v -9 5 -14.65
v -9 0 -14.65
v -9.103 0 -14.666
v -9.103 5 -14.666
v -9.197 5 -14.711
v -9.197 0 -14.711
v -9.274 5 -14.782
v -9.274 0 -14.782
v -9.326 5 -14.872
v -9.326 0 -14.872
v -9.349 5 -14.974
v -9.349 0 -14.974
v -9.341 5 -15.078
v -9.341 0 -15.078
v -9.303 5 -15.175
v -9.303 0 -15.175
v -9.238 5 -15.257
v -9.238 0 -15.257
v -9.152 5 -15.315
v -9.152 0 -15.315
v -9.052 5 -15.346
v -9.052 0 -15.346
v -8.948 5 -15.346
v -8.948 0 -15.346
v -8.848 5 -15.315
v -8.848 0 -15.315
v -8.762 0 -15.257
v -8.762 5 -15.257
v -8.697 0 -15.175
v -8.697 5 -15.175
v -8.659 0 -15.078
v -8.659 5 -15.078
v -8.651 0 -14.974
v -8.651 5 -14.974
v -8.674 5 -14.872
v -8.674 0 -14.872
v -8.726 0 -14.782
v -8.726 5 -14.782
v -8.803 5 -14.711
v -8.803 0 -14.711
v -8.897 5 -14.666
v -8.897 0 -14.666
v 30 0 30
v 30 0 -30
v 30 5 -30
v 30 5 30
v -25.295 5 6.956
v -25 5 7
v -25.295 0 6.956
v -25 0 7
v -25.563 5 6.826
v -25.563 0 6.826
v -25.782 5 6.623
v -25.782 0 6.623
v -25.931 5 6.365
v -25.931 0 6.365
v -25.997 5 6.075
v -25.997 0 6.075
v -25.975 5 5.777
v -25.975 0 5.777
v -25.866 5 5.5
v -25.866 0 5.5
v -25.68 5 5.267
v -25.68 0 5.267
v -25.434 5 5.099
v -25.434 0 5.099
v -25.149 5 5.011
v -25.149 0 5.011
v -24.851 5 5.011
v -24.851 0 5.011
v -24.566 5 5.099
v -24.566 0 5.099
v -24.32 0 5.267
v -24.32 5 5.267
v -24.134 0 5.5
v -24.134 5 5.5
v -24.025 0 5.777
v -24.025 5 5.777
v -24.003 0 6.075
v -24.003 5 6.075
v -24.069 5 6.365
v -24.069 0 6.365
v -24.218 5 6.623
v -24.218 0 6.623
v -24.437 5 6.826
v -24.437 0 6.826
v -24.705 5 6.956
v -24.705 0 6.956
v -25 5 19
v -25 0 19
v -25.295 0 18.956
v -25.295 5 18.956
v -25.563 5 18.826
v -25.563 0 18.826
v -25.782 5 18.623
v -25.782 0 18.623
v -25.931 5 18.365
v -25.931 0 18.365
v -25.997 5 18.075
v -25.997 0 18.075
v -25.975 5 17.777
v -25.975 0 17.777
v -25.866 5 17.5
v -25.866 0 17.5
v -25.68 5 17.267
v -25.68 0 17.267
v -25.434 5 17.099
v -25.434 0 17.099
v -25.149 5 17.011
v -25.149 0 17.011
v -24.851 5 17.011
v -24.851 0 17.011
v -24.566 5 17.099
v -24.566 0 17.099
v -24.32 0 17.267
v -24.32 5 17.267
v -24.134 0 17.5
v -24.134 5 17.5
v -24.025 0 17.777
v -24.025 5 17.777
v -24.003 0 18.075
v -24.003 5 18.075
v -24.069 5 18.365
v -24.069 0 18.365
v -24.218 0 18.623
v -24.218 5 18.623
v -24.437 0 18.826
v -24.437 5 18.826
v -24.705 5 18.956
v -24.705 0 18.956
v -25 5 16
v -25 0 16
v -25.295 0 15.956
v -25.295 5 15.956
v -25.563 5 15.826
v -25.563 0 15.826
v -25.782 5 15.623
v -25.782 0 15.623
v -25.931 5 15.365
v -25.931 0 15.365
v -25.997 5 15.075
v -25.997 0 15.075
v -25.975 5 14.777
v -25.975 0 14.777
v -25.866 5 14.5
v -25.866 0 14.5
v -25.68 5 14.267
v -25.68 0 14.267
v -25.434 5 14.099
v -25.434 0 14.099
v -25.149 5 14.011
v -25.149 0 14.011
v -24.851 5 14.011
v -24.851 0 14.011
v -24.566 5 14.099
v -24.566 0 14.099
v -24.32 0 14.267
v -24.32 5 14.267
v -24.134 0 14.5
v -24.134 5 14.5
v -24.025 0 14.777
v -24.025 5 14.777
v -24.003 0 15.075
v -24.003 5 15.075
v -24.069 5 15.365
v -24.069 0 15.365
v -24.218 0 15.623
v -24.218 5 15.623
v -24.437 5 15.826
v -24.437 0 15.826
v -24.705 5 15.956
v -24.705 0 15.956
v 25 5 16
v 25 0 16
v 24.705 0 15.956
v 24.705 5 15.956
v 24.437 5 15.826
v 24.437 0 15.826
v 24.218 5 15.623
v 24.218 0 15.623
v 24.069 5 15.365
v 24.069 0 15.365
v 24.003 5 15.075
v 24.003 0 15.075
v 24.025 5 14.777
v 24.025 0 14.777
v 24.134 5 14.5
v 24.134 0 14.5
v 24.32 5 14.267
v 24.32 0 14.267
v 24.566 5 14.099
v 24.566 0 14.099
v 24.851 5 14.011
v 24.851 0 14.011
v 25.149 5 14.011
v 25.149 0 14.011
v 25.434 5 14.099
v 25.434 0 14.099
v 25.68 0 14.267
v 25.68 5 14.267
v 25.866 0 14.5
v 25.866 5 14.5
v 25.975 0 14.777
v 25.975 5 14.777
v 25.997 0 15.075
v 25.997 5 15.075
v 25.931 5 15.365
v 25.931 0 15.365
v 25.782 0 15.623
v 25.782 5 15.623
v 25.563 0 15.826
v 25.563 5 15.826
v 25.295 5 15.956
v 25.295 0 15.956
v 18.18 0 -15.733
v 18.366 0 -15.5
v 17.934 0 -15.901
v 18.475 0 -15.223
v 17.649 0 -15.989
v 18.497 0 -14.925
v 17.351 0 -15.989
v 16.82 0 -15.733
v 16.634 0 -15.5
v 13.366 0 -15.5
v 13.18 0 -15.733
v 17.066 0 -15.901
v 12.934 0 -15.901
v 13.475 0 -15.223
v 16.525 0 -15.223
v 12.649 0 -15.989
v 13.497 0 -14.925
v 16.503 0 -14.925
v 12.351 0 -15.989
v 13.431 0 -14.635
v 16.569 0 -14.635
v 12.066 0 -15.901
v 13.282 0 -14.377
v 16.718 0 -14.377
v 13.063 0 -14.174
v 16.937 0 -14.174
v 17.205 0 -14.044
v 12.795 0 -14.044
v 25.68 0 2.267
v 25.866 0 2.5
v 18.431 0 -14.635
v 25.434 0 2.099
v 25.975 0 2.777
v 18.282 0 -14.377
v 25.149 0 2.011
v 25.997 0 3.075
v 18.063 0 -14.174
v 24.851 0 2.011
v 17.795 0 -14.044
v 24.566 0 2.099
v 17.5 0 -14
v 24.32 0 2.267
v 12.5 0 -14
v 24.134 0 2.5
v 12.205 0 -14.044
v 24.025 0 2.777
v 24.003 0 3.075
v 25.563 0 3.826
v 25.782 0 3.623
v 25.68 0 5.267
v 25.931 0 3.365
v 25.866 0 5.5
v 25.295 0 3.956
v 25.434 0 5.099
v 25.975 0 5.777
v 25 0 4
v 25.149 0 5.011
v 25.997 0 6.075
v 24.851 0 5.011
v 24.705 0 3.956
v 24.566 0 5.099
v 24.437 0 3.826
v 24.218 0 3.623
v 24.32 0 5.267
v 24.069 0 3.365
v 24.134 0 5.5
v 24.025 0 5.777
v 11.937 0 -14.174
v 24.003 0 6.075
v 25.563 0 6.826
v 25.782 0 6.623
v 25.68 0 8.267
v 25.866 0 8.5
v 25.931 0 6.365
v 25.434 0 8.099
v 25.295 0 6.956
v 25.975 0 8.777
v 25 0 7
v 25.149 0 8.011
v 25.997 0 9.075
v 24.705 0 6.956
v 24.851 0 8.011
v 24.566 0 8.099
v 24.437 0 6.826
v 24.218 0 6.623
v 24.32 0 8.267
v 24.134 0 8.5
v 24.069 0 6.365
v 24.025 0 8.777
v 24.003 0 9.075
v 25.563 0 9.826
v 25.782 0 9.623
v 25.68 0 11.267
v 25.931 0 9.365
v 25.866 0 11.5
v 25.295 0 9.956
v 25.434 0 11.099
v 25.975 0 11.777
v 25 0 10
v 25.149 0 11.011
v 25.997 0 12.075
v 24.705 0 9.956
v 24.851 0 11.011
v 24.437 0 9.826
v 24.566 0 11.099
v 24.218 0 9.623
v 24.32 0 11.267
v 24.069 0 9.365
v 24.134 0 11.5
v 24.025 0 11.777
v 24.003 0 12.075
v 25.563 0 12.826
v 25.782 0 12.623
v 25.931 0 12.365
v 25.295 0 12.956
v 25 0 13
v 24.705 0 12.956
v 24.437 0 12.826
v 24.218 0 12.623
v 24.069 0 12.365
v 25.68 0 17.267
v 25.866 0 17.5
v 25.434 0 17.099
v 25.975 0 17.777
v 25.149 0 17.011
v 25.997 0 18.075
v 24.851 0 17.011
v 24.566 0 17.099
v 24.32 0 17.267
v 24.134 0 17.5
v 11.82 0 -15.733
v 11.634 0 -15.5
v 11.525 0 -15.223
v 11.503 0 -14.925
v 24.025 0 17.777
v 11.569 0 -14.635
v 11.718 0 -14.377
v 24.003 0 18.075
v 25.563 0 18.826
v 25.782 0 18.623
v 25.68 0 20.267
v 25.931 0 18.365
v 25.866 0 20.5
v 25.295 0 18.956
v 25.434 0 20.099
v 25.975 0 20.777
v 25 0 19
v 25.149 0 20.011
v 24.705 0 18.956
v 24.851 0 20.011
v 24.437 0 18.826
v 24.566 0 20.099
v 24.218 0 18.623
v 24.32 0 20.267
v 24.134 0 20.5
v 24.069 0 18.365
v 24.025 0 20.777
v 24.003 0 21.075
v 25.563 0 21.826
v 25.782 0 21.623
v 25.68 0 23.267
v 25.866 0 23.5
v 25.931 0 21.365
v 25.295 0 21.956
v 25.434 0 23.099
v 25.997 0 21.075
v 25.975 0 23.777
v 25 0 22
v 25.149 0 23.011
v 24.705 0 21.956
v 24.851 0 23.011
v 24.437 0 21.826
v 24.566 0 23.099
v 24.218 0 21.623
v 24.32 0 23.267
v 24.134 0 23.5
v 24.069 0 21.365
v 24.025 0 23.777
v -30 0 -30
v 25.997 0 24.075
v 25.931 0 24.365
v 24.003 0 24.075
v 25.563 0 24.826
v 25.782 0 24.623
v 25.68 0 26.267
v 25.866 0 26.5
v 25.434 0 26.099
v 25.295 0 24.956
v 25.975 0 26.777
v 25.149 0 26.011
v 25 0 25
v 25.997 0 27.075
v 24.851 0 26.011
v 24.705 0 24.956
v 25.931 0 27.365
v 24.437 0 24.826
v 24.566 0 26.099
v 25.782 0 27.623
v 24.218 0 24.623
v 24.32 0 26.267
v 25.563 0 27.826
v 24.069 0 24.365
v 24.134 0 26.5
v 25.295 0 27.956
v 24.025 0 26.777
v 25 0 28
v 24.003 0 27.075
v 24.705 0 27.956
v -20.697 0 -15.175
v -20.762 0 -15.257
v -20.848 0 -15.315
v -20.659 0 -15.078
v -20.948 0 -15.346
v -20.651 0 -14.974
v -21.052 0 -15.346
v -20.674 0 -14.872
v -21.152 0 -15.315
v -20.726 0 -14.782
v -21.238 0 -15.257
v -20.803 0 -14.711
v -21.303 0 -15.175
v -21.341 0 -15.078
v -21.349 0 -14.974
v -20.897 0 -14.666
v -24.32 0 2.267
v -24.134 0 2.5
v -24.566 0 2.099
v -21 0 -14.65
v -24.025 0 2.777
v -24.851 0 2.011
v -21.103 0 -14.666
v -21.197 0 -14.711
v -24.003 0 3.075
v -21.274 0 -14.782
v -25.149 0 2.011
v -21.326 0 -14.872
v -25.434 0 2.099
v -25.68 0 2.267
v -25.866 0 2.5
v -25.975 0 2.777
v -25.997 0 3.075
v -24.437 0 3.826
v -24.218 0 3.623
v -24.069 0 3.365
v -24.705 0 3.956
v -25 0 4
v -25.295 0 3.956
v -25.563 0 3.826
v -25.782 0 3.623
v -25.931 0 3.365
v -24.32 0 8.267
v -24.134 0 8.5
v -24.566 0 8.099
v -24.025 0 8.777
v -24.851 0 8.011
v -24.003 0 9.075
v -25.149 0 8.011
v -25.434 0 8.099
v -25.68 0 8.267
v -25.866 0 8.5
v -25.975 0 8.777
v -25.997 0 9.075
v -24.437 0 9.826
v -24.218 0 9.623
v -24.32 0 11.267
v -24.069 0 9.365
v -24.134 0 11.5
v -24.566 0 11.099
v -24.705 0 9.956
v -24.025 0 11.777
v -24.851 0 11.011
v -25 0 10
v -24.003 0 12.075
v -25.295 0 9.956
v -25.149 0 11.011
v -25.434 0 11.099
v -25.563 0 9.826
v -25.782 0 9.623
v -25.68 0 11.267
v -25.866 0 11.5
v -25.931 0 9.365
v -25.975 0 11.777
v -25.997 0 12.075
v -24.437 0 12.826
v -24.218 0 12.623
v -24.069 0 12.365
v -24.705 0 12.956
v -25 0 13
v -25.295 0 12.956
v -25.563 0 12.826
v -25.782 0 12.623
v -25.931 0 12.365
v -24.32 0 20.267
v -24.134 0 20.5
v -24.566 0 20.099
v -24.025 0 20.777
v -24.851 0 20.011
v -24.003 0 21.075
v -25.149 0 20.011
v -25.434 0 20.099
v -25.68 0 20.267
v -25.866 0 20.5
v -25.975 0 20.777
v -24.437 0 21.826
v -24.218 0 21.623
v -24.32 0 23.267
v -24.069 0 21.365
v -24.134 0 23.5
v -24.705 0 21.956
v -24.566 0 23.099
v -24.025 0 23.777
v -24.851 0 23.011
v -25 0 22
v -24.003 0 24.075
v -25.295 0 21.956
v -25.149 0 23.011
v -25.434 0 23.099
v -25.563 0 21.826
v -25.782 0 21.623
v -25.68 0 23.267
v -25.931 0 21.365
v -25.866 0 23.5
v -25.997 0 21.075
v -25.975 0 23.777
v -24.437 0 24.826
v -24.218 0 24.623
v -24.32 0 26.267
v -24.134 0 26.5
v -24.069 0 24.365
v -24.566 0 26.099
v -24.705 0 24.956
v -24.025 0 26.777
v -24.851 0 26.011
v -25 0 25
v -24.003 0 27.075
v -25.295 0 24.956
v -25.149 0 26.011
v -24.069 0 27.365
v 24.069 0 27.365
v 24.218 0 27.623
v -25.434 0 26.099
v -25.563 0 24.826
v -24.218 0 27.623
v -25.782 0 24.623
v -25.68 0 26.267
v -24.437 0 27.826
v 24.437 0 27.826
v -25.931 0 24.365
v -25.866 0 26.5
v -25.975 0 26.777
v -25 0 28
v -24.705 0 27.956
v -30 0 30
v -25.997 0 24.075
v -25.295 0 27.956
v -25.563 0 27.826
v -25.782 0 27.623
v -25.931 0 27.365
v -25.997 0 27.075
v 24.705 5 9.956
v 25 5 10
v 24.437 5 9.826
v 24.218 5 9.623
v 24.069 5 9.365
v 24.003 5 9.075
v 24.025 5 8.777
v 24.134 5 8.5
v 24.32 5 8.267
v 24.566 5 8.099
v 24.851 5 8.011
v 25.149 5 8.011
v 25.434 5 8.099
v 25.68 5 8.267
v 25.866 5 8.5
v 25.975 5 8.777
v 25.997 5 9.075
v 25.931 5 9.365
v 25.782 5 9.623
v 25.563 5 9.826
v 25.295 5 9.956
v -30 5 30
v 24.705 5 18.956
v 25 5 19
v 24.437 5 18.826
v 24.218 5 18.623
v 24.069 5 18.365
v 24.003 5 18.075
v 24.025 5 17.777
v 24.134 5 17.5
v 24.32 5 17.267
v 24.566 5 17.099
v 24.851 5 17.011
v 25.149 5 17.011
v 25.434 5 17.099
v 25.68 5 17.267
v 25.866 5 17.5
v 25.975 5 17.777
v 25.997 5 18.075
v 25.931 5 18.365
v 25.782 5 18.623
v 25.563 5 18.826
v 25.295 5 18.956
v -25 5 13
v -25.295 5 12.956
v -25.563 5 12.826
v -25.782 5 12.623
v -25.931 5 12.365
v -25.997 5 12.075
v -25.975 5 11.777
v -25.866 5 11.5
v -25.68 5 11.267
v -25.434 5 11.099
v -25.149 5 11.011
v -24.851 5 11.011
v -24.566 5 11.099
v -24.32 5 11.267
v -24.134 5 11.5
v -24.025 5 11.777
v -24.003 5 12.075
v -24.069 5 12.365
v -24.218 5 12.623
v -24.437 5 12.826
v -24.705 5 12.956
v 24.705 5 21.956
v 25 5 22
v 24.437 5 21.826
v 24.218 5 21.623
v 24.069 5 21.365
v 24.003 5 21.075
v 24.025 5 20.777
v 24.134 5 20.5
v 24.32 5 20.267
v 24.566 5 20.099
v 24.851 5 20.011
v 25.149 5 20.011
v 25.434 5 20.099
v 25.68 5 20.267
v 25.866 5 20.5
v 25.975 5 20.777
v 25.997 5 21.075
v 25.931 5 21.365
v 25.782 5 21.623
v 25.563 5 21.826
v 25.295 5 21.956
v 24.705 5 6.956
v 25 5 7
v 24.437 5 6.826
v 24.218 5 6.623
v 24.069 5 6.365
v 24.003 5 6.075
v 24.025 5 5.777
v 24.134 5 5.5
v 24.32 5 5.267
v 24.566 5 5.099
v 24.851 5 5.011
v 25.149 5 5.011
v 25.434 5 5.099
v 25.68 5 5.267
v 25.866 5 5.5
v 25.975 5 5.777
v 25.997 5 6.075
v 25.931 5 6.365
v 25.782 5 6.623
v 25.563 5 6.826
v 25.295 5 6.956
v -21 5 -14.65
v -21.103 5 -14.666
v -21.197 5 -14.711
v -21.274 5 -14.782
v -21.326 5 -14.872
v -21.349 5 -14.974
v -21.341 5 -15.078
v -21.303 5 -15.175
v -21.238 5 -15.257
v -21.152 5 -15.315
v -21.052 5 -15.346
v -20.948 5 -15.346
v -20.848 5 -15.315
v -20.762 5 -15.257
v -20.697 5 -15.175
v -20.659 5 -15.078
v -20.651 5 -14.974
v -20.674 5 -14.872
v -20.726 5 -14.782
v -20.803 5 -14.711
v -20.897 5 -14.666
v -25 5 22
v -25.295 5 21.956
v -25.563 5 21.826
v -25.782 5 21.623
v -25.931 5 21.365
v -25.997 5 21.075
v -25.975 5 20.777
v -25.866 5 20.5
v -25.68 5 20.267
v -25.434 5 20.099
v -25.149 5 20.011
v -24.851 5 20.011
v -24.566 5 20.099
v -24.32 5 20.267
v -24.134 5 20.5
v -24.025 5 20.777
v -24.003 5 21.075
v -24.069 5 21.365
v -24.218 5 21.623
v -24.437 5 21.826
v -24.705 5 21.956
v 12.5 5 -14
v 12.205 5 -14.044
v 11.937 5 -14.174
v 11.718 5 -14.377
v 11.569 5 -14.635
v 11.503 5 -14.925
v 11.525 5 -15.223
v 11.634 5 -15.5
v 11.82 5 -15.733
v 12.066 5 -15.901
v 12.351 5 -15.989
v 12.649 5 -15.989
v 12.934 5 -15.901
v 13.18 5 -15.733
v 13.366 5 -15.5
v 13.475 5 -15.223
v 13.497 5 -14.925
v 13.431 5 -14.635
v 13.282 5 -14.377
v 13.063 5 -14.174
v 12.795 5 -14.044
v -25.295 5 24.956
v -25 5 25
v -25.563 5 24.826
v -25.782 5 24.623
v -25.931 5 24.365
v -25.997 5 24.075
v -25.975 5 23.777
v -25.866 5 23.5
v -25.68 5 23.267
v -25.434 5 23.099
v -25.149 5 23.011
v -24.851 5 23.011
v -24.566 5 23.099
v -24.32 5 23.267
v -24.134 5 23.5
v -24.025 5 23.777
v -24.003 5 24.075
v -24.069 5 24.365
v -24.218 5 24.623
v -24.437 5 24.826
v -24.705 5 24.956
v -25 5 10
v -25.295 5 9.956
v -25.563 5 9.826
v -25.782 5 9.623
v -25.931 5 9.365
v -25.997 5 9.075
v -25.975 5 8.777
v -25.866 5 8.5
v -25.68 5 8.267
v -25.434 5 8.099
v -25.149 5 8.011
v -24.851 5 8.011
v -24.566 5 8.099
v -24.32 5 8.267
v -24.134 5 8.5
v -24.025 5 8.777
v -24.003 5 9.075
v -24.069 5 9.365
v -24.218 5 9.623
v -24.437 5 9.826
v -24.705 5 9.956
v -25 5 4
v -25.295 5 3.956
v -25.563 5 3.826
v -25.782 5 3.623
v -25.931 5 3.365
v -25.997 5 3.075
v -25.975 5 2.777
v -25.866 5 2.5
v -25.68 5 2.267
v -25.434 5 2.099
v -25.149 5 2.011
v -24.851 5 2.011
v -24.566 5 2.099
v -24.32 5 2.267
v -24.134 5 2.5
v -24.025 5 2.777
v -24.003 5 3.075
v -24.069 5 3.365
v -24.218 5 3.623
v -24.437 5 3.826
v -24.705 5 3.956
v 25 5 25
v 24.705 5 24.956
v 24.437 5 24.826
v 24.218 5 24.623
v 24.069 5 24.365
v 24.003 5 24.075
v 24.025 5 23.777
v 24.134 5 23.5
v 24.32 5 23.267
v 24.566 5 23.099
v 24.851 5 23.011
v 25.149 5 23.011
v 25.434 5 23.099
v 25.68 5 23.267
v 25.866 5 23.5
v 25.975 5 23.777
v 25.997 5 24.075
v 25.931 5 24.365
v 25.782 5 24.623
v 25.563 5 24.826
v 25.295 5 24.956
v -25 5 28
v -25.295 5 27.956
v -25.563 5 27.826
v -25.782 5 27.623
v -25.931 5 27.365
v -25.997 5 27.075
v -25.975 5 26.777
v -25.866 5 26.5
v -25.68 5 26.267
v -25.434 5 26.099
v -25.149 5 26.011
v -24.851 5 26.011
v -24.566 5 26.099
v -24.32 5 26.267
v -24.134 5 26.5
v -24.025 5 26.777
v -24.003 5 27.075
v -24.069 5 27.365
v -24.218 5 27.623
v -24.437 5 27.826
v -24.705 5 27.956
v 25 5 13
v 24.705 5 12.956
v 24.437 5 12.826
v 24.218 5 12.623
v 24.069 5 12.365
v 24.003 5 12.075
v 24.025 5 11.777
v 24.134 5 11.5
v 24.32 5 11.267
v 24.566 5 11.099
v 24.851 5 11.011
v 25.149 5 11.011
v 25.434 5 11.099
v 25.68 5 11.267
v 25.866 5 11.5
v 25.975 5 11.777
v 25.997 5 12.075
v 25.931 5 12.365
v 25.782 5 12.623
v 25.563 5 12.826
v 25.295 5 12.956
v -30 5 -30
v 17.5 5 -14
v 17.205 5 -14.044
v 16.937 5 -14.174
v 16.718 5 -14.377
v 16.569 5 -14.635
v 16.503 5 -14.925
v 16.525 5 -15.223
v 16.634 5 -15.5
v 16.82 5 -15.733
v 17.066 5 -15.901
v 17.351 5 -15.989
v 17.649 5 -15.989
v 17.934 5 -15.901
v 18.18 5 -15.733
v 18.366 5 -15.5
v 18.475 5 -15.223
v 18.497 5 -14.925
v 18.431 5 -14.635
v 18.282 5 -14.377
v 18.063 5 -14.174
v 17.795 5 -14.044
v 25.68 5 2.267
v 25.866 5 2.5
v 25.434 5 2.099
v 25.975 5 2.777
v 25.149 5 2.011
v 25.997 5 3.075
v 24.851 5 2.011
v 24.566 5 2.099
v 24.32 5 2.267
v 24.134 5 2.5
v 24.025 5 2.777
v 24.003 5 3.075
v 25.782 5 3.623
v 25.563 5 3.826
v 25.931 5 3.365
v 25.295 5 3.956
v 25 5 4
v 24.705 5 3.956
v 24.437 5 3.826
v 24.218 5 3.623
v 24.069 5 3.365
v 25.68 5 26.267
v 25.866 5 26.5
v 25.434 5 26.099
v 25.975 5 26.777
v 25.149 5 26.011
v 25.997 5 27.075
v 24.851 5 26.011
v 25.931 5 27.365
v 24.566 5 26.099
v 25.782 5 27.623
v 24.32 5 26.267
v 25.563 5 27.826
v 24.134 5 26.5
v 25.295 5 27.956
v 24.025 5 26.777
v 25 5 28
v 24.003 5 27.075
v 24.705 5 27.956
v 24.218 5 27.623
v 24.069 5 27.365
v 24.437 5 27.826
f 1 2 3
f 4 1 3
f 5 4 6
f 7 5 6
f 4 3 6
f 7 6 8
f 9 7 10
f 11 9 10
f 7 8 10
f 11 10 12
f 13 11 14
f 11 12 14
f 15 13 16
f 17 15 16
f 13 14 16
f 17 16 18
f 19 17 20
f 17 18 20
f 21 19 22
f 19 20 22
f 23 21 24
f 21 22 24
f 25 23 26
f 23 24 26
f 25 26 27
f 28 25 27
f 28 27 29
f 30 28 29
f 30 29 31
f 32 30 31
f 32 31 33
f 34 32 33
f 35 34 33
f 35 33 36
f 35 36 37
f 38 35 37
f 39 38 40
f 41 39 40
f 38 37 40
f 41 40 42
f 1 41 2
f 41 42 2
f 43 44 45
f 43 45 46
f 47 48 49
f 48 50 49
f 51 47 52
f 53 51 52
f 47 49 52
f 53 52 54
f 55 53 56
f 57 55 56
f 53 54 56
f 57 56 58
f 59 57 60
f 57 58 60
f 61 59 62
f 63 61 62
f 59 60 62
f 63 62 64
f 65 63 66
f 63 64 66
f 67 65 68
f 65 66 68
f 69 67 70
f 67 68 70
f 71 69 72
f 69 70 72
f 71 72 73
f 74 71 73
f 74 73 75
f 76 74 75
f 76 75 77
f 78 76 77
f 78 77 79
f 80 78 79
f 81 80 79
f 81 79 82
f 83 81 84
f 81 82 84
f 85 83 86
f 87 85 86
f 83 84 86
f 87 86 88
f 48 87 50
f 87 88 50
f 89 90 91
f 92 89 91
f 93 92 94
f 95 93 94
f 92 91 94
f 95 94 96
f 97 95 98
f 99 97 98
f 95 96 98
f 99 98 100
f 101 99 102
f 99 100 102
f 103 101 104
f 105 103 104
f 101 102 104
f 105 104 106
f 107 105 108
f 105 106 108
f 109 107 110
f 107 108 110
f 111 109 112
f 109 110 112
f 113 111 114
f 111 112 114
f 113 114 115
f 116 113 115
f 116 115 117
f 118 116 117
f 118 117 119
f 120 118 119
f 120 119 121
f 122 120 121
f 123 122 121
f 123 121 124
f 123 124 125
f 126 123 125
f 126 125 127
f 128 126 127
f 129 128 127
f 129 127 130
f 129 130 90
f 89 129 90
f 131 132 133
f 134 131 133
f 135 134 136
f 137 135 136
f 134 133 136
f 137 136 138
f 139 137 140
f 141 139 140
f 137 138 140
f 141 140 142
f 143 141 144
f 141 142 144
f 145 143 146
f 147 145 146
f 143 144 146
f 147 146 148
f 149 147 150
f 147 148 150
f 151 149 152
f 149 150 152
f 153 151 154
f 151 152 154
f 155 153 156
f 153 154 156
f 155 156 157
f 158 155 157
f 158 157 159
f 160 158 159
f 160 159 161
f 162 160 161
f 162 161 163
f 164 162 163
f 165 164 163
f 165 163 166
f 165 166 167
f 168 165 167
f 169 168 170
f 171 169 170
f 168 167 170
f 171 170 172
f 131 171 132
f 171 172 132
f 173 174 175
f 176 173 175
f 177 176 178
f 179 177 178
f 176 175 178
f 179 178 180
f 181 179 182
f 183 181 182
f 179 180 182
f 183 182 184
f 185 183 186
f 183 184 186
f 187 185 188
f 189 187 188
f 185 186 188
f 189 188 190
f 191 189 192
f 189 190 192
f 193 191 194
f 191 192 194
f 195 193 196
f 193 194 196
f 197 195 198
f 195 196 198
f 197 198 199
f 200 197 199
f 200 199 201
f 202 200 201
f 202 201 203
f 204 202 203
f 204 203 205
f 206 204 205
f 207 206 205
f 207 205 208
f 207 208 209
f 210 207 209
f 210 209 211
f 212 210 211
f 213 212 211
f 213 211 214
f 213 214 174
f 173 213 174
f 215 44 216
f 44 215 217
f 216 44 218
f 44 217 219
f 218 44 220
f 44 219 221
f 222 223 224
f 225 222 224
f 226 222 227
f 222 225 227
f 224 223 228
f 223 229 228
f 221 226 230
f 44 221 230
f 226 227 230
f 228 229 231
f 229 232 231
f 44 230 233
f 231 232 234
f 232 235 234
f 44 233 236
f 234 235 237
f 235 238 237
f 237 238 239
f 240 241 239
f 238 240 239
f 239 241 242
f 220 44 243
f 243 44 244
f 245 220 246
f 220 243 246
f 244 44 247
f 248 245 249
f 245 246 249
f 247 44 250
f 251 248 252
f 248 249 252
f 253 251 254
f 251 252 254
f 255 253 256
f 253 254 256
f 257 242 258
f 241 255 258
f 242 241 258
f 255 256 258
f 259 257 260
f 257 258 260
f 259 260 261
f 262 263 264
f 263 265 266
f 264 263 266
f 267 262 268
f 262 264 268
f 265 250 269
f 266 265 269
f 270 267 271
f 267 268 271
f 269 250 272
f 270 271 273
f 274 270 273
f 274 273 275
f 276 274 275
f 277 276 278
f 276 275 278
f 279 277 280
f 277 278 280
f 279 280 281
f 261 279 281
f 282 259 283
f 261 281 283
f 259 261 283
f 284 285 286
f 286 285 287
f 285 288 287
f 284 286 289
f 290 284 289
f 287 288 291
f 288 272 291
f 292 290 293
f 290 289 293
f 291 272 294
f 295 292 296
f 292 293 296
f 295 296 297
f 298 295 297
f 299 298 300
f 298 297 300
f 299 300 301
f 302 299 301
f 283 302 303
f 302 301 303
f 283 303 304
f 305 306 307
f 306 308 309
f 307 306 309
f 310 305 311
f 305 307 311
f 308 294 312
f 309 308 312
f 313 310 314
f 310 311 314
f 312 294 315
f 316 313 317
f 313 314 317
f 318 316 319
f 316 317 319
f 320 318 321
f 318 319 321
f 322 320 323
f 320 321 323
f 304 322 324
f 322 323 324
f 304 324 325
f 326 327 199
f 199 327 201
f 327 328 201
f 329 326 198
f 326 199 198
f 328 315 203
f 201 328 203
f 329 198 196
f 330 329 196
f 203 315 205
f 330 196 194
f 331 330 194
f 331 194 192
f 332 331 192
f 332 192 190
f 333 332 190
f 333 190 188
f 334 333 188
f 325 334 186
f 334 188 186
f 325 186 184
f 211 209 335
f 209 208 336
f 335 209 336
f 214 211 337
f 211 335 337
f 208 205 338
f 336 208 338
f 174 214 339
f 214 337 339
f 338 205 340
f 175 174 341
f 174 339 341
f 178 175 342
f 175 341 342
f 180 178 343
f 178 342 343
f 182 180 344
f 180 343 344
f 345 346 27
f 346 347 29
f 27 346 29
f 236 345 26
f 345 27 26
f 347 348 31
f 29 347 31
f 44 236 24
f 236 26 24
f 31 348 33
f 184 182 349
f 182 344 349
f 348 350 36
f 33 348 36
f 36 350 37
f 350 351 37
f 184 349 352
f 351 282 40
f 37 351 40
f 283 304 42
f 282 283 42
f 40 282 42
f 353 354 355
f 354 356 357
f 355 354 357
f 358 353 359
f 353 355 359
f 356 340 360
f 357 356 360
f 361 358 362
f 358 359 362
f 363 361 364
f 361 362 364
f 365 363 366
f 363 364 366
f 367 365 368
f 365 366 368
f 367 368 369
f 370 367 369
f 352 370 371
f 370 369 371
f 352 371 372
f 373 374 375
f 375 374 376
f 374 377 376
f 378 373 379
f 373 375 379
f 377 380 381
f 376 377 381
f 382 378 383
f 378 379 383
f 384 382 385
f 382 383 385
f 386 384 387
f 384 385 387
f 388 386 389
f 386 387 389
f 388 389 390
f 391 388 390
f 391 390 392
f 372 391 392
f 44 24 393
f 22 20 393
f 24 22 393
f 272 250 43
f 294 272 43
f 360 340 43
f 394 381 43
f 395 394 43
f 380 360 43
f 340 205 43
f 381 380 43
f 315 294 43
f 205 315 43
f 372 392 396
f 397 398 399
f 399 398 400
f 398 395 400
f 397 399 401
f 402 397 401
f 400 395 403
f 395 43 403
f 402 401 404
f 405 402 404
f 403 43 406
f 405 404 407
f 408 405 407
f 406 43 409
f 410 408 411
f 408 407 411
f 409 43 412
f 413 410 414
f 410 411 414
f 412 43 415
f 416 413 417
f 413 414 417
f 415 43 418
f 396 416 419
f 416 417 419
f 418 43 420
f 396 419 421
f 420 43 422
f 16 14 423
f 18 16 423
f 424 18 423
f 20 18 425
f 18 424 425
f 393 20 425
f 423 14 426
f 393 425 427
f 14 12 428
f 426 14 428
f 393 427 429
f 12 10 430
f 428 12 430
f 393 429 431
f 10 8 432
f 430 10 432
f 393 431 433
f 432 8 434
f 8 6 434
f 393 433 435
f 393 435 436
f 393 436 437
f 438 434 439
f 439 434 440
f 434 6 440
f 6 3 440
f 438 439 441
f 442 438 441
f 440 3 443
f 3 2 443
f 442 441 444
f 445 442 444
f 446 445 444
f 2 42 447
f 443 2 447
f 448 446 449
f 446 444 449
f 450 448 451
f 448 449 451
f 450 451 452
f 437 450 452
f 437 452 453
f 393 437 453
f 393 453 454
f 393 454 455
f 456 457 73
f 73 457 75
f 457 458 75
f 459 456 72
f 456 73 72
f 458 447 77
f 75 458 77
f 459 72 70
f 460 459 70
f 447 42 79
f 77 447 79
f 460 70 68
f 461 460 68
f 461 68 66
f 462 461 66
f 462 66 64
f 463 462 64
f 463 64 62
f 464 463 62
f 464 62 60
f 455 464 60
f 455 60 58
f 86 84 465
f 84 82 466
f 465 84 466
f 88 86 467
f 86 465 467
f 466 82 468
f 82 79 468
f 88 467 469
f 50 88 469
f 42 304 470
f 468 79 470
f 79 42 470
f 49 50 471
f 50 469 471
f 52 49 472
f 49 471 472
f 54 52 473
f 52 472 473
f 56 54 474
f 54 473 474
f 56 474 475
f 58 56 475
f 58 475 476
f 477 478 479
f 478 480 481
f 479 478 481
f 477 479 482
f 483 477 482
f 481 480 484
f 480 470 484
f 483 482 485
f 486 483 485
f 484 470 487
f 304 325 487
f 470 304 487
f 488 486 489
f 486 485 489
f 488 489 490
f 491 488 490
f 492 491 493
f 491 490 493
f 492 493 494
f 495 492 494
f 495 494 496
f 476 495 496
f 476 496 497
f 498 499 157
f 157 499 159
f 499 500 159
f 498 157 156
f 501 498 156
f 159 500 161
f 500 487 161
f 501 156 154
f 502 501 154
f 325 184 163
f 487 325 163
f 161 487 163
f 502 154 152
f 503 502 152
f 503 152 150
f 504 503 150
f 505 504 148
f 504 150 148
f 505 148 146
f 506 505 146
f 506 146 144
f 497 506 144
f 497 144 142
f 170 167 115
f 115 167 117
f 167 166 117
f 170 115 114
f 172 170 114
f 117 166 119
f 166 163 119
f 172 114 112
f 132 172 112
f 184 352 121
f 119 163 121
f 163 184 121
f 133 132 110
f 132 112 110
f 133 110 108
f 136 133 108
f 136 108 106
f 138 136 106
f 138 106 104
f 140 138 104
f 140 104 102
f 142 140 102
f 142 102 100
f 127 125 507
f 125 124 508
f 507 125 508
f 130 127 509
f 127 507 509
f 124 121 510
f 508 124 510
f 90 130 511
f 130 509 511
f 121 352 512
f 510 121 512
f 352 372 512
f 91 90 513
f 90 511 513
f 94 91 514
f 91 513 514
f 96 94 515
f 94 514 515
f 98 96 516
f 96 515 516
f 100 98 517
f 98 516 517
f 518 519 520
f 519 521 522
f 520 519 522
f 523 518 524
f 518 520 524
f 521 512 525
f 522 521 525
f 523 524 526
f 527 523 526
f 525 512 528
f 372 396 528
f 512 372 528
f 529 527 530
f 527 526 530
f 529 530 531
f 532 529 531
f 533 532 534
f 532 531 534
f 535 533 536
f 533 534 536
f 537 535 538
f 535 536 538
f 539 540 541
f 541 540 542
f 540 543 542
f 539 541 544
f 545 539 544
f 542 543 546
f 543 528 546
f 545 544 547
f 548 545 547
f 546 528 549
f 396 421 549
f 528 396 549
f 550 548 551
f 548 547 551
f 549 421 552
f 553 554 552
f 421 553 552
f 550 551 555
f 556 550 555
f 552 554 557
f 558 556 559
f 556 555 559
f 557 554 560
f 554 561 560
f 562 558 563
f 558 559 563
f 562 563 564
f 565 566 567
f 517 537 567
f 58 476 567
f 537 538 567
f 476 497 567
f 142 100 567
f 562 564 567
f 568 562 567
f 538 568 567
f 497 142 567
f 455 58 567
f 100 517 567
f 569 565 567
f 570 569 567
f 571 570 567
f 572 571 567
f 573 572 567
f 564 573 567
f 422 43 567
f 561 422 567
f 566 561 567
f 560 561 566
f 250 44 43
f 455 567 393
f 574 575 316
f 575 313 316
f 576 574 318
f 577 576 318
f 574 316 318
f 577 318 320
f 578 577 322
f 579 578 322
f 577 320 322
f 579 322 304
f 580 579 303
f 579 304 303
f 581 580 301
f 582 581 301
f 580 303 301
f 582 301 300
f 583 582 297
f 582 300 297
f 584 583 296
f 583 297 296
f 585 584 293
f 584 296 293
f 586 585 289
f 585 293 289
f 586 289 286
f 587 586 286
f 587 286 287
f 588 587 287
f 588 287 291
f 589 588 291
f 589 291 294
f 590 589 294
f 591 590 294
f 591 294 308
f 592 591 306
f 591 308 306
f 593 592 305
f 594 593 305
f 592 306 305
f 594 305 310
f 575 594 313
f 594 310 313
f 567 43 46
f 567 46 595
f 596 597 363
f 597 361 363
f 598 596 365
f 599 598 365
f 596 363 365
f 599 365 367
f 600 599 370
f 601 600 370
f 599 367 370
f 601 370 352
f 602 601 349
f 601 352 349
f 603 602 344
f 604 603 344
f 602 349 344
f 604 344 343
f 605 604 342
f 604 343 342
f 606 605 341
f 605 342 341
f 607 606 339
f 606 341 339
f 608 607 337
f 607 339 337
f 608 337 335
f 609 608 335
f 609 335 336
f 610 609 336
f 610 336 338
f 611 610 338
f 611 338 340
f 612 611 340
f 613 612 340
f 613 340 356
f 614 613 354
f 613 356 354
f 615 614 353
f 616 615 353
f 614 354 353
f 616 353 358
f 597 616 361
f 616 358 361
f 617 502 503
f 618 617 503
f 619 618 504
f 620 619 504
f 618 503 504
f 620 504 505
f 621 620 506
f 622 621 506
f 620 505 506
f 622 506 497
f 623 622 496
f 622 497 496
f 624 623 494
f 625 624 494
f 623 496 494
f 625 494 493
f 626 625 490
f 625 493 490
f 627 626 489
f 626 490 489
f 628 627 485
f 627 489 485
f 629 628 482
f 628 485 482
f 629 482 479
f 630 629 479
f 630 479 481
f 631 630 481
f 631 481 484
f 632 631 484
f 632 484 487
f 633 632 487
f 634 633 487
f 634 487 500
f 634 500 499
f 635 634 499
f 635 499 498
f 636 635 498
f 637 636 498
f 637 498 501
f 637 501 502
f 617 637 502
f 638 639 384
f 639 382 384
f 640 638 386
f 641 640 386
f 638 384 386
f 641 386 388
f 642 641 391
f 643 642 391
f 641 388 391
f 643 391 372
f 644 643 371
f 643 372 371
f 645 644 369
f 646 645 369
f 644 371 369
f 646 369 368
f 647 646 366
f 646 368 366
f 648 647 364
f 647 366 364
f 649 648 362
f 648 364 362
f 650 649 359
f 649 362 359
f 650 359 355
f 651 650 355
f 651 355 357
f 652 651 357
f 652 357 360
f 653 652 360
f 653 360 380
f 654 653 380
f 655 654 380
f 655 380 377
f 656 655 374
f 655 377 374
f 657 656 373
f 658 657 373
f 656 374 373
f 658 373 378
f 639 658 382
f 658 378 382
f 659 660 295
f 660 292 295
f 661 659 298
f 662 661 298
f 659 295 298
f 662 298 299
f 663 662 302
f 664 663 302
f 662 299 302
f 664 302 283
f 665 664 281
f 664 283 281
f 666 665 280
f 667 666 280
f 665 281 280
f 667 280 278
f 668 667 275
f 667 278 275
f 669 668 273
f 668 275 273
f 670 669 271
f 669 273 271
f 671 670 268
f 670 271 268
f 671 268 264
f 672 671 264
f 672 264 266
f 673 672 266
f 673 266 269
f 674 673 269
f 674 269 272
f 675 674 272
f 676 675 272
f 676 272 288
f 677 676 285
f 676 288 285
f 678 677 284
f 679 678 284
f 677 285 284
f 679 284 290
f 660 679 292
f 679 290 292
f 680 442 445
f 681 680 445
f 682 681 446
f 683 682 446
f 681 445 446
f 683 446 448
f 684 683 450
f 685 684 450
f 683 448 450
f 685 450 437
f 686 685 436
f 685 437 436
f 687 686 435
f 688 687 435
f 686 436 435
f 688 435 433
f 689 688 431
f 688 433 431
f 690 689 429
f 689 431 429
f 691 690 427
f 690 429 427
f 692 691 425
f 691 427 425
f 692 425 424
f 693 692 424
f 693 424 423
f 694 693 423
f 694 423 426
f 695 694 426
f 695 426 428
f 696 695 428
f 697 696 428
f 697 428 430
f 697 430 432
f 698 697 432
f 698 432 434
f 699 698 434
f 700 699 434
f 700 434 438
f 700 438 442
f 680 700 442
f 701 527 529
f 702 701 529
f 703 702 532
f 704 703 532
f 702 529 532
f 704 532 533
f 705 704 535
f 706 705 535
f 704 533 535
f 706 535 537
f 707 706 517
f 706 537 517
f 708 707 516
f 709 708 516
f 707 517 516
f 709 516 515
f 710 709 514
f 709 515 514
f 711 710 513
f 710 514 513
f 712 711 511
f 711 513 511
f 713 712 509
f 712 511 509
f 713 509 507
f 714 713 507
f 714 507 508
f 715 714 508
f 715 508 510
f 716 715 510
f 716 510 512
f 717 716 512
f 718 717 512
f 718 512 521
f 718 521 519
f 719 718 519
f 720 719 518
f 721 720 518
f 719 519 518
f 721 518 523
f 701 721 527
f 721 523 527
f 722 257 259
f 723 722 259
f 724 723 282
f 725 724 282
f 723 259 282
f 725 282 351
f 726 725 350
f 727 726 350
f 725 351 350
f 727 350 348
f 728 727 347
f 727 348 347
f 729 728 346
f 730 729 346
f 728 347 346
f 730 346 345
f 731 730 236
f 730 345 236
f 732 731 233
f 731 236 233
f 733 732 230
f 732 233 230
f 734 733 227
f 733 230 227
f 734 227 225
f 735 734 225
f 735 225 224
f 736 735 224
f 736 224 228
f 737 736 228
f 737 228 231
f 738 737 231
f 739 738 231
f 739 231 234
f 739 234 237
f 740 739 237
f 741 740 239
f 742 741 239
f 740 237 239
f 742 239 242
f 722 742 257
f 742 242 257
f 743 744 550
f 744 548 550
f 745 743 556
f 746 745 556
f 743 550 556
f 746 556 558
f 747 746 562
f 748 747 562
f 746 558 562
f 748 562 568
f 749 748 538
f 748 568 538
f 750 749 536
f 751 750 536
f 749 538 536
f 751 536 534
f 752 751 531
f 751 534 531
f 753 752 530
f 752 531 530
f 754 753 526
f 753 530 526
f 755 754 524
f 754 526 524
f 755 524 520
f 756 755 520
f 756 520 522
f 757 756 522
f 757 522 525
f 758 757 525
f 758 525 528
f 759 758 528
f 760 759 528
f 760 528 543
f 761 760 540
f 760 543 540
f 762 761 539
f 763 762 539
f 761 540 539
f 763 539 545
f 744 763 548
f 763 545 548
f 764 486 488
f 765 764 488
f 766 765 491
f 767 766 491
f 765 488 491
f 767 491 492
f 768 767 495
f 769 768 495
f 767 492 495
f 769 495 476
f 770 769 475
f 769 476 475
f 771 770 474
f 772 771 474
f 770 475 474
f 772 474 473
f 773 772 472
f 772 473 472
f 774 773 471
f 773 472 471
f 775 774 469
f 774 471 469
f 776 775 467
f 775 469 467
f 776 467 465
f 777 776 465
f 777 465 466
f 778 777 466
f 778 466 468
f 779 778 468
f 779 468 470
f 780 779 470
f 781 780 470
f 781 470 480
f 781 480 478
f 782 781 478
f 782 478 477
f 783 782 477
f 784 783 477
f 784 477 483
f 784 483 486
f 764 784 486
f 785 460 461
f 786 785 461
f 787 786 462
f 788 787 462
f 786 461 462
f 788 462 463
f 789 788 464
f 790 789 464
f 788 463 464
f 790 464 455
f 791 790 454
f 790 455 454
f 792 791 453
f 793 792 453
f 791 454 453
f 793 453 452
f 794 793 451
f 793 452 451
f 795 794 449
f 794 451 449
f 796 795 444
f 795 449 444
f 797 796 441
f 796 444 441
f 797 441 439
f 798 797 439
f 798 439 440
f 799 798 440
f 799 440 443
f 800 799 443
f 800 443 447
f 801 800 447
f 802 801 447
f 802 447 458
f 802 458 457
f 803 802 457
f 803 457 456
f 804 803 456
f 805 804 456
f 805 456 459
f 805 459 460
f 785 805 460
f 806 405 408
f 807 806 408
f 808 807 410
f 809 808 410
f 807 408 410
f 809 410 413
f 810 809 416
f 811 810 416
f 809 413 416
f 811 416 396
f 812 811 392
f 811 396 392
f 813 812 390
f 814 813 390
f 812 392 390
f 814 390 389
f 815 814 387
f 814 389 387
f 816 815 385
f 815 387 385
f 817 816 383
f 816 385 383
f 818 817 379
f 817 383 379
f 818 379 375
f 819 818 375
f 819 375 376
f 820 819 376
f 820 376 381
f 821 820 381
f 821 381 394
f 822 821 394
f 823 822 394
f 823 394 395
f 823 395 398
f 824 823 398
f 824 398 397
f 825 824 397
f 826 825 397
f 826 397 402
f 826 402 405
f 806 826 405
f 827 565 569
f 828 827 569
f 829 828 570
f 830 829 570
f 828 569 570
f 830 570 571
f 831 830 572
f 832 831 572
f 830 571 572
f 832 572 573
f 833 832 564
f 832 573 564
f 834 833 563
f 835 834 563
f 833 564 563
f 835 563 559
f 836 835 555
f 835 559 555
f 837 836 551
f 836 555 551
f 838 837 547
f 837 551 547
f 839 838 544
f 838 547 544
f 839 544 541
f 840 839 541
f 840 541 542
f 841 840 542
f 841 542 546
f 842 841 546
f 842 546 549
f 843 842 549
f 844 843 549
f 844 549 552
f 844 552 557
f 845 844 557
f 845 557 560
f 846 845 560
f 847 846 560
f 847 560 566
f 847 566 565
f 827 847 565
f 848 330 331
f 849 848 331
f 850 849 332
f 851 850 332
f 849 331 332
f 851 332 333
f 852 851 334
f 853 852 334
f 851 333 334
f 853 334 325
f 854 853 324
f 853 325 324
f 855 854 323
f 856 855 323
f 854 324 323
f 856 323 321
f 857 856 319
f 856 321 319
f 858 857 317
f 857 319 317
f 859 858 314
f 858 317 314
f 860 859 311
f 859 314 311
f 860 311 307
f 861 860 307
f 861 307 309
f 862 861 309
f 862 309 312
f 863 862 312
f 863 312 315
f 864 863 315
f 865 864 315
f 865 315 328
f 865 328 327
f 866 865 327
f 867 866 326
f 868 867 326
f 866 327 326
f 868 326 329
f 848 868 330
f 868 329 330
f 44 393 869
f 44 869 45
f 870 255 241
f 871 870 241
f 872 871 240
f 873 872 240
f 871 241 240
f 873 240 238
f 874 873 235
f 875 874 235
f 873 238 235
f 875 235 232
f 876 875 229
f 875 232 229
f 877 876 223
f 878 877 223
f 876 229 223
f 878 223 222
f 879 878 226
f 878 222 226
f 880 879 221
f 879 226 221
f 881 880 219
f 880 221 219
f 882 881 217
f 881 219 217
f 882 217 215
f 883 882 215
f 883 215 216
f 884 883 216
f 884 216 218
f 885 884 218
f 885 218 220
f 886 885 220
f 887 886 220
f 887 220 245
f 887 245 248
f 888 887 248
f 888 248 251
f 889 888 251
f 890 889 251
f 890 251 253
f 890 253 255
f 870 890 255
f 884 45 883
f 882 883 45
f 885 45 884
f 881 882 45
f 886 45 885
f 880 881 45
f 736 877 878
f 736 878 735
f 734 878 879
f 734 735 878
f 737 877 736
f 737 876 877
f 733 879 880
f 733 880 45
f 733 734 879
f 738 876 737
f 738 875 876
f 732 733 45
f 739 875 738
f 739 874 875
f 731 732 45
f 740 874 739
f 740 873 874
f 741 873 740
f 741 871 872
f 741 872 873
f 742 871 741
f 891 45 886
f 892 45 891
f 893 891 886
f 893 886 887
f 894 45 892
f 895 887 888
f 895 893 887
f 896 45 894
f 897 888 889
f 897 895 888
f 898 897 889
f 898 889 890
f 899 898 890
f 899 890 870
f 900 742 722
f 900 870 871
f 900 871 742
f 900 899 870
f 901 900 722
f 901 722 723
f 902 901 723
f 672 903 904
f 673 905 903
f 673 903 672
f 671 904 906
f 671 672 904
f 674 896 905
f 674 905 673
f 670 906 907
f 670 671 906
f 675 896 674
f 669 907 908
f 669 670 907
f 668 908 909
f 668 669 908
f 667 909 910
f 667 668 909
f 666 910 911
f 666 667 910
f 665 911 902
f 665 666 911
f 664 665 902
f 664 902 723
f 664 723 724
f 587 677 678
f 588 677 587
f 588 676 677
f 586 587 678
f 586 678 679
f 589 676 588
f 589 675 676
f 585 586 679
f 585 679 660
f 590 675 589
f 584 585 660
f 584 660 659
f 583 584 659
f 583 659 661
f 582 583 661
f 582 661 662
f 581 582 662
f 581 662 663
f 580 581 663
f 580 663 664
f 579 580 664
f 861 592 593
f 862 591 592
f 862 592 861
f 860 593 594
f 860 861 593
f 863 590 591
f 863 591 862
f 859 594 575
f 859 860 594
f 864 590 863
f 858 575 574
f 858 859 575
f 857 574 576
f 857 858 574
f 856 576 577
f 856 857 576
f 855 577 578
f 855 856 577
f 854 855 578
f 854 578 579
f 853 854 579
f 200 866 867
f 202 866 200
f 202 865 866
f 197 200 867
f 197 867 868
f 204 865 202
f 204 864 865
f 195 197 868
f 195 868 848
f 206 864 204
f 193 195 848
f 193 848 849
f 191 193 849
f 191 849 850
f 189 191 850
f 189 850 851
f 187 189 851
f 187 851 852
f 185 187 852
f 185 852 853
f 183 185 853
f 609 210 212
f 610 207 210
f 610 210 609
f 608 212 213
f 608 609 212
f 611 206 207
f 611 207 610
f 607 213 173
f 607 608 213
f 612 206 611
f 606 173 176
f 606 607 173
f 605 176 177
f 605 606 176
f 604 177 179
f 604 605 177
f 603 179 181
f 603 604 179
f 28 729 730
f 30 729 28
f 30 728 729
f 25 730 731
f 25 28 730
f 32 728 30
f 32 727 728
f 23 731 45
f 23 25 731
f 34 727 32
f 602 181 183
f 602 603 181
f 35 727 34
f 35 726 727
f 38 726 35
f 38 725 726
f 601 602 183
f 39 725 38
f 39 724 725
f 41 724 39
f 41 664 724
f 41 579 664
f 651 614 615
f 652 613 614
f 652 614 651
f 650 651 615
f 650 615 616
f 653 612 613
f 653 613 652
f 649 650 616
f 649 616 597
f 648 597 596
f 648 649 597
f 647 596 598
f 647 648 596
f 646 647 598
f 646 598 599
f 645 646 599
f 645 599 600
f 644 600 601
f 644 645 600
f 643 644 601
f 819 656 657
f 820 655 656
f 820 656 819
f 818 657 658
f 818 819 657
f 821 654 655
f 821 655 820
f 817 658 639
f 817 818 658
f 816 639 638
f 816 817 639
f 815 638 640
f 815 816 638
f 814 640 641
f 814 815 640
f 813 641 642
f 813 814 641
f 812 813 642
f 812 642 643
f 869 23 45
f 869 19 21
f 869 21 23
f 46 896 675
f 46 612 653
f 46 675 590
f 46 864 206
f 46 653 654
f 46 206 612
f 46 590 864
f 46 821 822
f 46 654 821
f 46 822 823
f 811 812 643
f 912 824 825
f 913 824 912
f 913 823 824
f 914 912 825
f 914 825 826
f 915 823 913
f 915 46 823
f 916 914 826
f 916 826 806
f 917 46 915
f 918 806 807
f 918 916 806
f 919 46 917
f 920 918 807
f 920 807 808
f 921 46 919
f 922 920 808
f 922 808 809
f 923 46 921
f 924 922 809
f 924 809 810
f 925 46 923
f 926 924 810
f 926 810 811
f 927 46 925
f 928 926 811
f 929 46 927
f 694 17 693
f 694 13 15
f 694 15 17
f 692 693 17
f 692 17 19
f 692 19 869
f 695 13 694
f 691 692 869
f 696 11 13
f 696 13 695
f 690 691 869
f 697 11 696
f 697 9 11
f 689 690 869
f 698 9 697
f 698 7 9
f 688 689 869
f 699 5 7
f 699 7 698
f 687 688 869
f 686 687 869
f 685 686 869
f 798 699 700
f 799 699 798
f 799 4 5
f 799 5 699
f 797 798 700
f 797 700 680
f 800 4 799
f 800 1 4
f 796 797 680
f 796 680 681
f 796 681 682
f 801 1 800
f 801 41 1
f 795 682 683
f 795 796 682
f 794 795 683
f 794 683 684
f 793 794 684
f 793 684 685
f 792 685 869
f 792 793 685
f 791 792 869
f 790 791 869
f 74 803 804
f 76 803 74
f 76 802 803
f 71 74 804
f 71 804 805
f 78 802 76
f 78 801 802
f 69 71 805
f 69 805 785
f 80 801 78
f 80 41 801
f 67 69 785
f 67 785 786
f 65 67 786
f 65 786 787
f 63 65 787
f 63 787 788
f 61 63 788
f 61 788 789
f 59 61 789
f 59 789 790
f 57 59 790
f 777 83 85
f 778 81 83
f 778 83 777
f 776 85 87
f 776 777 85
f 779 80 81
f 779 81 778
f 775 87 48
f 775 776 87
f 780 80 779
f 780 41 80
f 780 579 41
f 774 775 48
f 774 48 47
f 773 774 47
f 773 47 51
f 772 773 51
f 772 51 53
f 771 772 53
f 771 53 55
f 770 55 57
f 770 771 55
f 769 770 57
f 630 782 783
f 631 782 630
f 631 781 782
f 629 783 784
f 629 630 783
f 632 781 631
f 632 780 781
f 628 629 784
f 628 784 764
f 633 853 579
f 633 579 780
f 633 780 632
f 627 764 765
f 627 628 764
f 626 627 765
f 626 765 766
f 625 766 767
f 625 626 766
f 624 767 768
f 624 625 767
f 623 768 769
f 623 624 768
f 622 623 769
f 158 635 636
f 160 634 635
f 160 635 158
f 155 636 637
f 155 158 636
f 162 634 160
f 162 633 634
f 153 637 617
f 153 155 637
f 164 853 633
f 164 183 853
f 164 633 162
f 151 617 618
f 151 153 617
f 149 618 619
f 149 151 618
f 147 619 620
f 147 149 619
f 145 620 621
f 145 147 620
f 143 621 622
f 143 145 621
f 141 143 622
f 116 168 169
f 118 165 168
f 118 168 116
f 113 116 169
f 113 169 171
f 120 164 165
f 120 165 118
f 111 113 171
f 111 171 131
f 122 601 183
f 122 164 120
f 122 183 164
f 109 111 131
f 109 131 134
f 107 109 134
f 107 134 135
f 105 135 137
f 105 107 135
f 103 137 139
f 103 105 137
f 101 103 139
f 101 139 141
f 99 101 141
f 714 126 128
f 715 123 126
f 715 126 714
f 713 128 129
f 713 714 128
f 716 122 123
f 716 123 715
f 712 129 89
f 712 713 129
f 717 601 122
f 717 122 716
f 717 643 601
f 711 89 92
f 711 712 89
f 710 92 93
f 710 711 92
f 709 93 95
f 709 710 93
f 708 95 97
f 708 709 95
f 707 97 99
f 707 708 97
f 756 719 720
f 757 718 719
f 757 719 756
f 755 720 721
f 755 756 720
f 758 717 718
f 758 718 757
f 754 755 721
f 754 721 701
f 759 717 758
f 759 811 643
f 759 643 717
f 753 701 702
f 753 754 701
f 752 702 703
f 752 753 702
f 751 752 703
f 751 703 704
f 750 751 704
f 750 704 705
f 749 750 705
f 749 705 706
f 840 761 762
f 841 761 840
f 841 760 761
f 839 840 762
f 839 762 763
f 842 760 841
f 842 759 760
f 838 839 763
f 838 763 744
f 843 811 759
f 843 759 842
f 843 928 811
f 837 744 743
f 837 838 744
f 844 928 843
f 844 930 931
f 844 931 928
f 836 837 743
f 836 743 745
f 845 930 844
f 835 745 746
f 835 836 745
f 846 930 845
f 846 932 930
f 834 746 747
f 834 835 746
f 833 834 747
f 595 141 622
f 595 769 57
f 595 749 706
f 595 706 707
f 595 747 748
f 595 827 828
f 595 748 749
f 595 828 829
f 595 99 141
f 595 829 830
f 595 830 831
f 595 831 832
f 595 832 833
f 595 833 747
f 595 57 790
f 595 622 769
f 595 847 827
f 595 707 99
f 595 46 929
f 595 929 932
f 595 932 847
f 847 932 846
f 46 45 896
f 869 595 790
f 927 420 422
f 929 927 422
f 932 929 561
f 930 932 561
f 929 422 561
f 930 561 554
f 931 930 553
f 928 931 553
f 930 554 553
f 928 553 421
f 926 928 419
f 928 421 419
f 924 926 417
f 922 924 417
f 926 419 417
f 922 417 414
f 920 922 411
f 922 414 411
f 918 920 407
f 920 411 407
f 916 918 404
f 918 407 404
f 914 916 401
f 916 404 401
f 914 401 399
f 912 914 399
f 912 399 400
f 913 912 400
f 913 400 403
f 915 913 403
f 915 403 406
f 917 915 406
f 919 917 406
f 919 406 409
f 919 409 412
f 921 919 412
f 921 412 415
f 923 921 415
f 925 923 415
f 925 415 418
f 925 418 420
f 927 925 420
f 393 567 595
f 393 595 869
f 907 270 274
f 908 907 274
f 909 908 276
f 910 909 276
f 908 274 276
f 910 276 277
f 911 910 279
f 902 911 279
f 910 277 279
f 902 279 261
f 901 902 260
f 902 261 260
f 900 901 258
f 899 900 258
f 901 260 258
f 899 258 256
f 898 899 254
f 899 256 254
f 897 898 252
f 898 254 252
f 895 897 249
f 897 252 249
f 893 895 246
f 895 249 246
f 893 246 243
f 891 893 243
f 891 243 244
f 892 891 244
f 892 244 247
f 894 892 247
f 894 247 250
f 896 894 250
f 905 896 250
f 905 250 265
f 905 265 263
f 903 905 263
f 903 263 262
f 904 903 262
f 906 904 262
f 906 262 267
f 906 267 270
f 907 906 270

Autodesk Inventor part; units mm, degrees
ref_plane "YZ Plane" through (0, 0, 0) normal (1, 0, 0) x (0, 1, 0)
ref_plane "XZ Plane" through (0, 0, 0) normal (0, 1, 0) x (-1, 0, 0)
ref_plane "XY Plane" through (0, 0, 0) normal (0, 0, 1) x (1, 0, 0)
sketch "Эскиз1" plane through (0, 0, 0) normal (0, 1, 0) x (-1, 0, 0)
  line L0 (0, 30) -> (30, 30)
  line L1 (30, 30) -> (30, -30)
  line L2 (30, -30) -> (-20, -30)
  line L3 (-20, 30) -> (0, 30)
  line L4 (-30, 0) -> (-30, -30)
  line L5 (-30, -30) -> (-30, 30)
  line L6 (-20, 30) -> (-30, 30)
  line L7 (-30, -30) -> (-20, -30)
  point P0 (0, 0)
extrude "Выдавливание1" add sketch "Эскиз1" along normal blind 5
sketch "Эскиз2" plane through (0, 5, 0) normal (0, 1, 0) x (1, 0, 0)
  line L0 (-30, 30) -> (-30, -30) projected
  line L1 (-30, 0) -> (30, 0)
  line L2 (30, -30) -> (30, 30) projected
  line L3 (0, 0) -> (0, 30)
  line L4 (30, 30) -> (-30, 30) projected
  line L5 (0, 15) -> (30, 15)
  line L6 (15, 0) -> (15, 30)
  line L7 (15, 15) -> (12.5, 15)
  line L8 (12.5, 15) -> (17.5, 15)
  dimension "d46" = 2.5
  dimension "d47" = 5
sketch "Эскиз3" plane through (0, 5, 0) normal (0, 1, 0) x (1, 0, 0)
  line L0 (30, -30) -> (30, 30) projected
  line L1 (-30, -30) -> (30, -30) projected
  line L2 (25, 0) -> (25, -3)
  line L3 (25, -30) -> (25, -27)
  line L4 (-25, -27) -> (-25, -3)
  line L5 (-25, -27) -> (-25, -24)
  line L6 (-25, -24) -> (-25, -21)
  line L7 (-25, -21) -> (-25, -18)
  line L8 (-25, -18) -> (-25, -15)
  line L9 (-25, -15) -> (-25, -12)
  line L10 (-25, -12) -> (-25, -9)
  line L11 (-25, -9) -> (-25, -6)
  line L12 (25, -27) -> (25, -3)
  line L13 (25, -27) -> (25, -24)
  line L14 (25, -24) -> (25, -21)
  line L15 (25, -21) -> (25, -18)
  line L16 (25, -18) -> (25, -15)
  line L17 (25, -15) -> (25, -12)
  line L18 (25, -12) -> (25, -9)
  line L19 (25, -9) -> (25, -6)
  point P0 (0, 0)
  dimension "d19" = 3
  dimension "d20" = 3
  dimension "d21" = 3
  dimension "d22" = 3
  dimension "d23" = 3
  dimension "d24" = 3
  dimension "d25" = 3
  dimension "d26" = 3
  dimension "d27" = 3
  dimension "d28" = 3
hole "Отверстие1" at (-25, 5, 27) at (-25, 5, 24) at (-25, 5, 21) at (-25, 5, 18) at (-25, 5, 15) at (-25, 5, 12) at (-25, 5, 9) at (-25, 5, 6) at (-25, 5, 3) at (25, 5, 27) at (25, 5, 24) at (25, 5, 21) at (25, 5, 18) at (25, 5, 15) at (25, 5, 12) at (25, 5, 9) at (25, 5, 6) at (25, 5, 3) direction (0, -1, 0) diameter 2 end through all
sketch "Эскиз4" plane through (0, 5, 0) normal (0, 1, 0) x (1, 0, 0)
  line L0 (-30, 30) -> (-30, -30) projected
  line L1 (-30, 0) -> (-30, 15)
  line L2 (-30, 15) -> (0, 15)
  line L3 (-30, 15) -> (-21, 15)
  line L4 (0, 15) -> (-9, 15)
  point P0 (0, 0)
  dimension "d36" = 15
  dimension "d37" = 9
  dimension "d38" = 9
hole "Отверстие2" at (-21, 5, -15) at (-9, 5, -15) direction (0, -1, 0) diameter 0.7 end through all
hole "Отверстие3" at (12.5, 5, -15) at (17.5, 5, -15) direction (0, -1, 0) diameter 2 end through all
ref_plane "РабПлоскость1" through (30, 5, -30) normal (0, -0.7071, -0.7071) x (-1, 0, 0)
